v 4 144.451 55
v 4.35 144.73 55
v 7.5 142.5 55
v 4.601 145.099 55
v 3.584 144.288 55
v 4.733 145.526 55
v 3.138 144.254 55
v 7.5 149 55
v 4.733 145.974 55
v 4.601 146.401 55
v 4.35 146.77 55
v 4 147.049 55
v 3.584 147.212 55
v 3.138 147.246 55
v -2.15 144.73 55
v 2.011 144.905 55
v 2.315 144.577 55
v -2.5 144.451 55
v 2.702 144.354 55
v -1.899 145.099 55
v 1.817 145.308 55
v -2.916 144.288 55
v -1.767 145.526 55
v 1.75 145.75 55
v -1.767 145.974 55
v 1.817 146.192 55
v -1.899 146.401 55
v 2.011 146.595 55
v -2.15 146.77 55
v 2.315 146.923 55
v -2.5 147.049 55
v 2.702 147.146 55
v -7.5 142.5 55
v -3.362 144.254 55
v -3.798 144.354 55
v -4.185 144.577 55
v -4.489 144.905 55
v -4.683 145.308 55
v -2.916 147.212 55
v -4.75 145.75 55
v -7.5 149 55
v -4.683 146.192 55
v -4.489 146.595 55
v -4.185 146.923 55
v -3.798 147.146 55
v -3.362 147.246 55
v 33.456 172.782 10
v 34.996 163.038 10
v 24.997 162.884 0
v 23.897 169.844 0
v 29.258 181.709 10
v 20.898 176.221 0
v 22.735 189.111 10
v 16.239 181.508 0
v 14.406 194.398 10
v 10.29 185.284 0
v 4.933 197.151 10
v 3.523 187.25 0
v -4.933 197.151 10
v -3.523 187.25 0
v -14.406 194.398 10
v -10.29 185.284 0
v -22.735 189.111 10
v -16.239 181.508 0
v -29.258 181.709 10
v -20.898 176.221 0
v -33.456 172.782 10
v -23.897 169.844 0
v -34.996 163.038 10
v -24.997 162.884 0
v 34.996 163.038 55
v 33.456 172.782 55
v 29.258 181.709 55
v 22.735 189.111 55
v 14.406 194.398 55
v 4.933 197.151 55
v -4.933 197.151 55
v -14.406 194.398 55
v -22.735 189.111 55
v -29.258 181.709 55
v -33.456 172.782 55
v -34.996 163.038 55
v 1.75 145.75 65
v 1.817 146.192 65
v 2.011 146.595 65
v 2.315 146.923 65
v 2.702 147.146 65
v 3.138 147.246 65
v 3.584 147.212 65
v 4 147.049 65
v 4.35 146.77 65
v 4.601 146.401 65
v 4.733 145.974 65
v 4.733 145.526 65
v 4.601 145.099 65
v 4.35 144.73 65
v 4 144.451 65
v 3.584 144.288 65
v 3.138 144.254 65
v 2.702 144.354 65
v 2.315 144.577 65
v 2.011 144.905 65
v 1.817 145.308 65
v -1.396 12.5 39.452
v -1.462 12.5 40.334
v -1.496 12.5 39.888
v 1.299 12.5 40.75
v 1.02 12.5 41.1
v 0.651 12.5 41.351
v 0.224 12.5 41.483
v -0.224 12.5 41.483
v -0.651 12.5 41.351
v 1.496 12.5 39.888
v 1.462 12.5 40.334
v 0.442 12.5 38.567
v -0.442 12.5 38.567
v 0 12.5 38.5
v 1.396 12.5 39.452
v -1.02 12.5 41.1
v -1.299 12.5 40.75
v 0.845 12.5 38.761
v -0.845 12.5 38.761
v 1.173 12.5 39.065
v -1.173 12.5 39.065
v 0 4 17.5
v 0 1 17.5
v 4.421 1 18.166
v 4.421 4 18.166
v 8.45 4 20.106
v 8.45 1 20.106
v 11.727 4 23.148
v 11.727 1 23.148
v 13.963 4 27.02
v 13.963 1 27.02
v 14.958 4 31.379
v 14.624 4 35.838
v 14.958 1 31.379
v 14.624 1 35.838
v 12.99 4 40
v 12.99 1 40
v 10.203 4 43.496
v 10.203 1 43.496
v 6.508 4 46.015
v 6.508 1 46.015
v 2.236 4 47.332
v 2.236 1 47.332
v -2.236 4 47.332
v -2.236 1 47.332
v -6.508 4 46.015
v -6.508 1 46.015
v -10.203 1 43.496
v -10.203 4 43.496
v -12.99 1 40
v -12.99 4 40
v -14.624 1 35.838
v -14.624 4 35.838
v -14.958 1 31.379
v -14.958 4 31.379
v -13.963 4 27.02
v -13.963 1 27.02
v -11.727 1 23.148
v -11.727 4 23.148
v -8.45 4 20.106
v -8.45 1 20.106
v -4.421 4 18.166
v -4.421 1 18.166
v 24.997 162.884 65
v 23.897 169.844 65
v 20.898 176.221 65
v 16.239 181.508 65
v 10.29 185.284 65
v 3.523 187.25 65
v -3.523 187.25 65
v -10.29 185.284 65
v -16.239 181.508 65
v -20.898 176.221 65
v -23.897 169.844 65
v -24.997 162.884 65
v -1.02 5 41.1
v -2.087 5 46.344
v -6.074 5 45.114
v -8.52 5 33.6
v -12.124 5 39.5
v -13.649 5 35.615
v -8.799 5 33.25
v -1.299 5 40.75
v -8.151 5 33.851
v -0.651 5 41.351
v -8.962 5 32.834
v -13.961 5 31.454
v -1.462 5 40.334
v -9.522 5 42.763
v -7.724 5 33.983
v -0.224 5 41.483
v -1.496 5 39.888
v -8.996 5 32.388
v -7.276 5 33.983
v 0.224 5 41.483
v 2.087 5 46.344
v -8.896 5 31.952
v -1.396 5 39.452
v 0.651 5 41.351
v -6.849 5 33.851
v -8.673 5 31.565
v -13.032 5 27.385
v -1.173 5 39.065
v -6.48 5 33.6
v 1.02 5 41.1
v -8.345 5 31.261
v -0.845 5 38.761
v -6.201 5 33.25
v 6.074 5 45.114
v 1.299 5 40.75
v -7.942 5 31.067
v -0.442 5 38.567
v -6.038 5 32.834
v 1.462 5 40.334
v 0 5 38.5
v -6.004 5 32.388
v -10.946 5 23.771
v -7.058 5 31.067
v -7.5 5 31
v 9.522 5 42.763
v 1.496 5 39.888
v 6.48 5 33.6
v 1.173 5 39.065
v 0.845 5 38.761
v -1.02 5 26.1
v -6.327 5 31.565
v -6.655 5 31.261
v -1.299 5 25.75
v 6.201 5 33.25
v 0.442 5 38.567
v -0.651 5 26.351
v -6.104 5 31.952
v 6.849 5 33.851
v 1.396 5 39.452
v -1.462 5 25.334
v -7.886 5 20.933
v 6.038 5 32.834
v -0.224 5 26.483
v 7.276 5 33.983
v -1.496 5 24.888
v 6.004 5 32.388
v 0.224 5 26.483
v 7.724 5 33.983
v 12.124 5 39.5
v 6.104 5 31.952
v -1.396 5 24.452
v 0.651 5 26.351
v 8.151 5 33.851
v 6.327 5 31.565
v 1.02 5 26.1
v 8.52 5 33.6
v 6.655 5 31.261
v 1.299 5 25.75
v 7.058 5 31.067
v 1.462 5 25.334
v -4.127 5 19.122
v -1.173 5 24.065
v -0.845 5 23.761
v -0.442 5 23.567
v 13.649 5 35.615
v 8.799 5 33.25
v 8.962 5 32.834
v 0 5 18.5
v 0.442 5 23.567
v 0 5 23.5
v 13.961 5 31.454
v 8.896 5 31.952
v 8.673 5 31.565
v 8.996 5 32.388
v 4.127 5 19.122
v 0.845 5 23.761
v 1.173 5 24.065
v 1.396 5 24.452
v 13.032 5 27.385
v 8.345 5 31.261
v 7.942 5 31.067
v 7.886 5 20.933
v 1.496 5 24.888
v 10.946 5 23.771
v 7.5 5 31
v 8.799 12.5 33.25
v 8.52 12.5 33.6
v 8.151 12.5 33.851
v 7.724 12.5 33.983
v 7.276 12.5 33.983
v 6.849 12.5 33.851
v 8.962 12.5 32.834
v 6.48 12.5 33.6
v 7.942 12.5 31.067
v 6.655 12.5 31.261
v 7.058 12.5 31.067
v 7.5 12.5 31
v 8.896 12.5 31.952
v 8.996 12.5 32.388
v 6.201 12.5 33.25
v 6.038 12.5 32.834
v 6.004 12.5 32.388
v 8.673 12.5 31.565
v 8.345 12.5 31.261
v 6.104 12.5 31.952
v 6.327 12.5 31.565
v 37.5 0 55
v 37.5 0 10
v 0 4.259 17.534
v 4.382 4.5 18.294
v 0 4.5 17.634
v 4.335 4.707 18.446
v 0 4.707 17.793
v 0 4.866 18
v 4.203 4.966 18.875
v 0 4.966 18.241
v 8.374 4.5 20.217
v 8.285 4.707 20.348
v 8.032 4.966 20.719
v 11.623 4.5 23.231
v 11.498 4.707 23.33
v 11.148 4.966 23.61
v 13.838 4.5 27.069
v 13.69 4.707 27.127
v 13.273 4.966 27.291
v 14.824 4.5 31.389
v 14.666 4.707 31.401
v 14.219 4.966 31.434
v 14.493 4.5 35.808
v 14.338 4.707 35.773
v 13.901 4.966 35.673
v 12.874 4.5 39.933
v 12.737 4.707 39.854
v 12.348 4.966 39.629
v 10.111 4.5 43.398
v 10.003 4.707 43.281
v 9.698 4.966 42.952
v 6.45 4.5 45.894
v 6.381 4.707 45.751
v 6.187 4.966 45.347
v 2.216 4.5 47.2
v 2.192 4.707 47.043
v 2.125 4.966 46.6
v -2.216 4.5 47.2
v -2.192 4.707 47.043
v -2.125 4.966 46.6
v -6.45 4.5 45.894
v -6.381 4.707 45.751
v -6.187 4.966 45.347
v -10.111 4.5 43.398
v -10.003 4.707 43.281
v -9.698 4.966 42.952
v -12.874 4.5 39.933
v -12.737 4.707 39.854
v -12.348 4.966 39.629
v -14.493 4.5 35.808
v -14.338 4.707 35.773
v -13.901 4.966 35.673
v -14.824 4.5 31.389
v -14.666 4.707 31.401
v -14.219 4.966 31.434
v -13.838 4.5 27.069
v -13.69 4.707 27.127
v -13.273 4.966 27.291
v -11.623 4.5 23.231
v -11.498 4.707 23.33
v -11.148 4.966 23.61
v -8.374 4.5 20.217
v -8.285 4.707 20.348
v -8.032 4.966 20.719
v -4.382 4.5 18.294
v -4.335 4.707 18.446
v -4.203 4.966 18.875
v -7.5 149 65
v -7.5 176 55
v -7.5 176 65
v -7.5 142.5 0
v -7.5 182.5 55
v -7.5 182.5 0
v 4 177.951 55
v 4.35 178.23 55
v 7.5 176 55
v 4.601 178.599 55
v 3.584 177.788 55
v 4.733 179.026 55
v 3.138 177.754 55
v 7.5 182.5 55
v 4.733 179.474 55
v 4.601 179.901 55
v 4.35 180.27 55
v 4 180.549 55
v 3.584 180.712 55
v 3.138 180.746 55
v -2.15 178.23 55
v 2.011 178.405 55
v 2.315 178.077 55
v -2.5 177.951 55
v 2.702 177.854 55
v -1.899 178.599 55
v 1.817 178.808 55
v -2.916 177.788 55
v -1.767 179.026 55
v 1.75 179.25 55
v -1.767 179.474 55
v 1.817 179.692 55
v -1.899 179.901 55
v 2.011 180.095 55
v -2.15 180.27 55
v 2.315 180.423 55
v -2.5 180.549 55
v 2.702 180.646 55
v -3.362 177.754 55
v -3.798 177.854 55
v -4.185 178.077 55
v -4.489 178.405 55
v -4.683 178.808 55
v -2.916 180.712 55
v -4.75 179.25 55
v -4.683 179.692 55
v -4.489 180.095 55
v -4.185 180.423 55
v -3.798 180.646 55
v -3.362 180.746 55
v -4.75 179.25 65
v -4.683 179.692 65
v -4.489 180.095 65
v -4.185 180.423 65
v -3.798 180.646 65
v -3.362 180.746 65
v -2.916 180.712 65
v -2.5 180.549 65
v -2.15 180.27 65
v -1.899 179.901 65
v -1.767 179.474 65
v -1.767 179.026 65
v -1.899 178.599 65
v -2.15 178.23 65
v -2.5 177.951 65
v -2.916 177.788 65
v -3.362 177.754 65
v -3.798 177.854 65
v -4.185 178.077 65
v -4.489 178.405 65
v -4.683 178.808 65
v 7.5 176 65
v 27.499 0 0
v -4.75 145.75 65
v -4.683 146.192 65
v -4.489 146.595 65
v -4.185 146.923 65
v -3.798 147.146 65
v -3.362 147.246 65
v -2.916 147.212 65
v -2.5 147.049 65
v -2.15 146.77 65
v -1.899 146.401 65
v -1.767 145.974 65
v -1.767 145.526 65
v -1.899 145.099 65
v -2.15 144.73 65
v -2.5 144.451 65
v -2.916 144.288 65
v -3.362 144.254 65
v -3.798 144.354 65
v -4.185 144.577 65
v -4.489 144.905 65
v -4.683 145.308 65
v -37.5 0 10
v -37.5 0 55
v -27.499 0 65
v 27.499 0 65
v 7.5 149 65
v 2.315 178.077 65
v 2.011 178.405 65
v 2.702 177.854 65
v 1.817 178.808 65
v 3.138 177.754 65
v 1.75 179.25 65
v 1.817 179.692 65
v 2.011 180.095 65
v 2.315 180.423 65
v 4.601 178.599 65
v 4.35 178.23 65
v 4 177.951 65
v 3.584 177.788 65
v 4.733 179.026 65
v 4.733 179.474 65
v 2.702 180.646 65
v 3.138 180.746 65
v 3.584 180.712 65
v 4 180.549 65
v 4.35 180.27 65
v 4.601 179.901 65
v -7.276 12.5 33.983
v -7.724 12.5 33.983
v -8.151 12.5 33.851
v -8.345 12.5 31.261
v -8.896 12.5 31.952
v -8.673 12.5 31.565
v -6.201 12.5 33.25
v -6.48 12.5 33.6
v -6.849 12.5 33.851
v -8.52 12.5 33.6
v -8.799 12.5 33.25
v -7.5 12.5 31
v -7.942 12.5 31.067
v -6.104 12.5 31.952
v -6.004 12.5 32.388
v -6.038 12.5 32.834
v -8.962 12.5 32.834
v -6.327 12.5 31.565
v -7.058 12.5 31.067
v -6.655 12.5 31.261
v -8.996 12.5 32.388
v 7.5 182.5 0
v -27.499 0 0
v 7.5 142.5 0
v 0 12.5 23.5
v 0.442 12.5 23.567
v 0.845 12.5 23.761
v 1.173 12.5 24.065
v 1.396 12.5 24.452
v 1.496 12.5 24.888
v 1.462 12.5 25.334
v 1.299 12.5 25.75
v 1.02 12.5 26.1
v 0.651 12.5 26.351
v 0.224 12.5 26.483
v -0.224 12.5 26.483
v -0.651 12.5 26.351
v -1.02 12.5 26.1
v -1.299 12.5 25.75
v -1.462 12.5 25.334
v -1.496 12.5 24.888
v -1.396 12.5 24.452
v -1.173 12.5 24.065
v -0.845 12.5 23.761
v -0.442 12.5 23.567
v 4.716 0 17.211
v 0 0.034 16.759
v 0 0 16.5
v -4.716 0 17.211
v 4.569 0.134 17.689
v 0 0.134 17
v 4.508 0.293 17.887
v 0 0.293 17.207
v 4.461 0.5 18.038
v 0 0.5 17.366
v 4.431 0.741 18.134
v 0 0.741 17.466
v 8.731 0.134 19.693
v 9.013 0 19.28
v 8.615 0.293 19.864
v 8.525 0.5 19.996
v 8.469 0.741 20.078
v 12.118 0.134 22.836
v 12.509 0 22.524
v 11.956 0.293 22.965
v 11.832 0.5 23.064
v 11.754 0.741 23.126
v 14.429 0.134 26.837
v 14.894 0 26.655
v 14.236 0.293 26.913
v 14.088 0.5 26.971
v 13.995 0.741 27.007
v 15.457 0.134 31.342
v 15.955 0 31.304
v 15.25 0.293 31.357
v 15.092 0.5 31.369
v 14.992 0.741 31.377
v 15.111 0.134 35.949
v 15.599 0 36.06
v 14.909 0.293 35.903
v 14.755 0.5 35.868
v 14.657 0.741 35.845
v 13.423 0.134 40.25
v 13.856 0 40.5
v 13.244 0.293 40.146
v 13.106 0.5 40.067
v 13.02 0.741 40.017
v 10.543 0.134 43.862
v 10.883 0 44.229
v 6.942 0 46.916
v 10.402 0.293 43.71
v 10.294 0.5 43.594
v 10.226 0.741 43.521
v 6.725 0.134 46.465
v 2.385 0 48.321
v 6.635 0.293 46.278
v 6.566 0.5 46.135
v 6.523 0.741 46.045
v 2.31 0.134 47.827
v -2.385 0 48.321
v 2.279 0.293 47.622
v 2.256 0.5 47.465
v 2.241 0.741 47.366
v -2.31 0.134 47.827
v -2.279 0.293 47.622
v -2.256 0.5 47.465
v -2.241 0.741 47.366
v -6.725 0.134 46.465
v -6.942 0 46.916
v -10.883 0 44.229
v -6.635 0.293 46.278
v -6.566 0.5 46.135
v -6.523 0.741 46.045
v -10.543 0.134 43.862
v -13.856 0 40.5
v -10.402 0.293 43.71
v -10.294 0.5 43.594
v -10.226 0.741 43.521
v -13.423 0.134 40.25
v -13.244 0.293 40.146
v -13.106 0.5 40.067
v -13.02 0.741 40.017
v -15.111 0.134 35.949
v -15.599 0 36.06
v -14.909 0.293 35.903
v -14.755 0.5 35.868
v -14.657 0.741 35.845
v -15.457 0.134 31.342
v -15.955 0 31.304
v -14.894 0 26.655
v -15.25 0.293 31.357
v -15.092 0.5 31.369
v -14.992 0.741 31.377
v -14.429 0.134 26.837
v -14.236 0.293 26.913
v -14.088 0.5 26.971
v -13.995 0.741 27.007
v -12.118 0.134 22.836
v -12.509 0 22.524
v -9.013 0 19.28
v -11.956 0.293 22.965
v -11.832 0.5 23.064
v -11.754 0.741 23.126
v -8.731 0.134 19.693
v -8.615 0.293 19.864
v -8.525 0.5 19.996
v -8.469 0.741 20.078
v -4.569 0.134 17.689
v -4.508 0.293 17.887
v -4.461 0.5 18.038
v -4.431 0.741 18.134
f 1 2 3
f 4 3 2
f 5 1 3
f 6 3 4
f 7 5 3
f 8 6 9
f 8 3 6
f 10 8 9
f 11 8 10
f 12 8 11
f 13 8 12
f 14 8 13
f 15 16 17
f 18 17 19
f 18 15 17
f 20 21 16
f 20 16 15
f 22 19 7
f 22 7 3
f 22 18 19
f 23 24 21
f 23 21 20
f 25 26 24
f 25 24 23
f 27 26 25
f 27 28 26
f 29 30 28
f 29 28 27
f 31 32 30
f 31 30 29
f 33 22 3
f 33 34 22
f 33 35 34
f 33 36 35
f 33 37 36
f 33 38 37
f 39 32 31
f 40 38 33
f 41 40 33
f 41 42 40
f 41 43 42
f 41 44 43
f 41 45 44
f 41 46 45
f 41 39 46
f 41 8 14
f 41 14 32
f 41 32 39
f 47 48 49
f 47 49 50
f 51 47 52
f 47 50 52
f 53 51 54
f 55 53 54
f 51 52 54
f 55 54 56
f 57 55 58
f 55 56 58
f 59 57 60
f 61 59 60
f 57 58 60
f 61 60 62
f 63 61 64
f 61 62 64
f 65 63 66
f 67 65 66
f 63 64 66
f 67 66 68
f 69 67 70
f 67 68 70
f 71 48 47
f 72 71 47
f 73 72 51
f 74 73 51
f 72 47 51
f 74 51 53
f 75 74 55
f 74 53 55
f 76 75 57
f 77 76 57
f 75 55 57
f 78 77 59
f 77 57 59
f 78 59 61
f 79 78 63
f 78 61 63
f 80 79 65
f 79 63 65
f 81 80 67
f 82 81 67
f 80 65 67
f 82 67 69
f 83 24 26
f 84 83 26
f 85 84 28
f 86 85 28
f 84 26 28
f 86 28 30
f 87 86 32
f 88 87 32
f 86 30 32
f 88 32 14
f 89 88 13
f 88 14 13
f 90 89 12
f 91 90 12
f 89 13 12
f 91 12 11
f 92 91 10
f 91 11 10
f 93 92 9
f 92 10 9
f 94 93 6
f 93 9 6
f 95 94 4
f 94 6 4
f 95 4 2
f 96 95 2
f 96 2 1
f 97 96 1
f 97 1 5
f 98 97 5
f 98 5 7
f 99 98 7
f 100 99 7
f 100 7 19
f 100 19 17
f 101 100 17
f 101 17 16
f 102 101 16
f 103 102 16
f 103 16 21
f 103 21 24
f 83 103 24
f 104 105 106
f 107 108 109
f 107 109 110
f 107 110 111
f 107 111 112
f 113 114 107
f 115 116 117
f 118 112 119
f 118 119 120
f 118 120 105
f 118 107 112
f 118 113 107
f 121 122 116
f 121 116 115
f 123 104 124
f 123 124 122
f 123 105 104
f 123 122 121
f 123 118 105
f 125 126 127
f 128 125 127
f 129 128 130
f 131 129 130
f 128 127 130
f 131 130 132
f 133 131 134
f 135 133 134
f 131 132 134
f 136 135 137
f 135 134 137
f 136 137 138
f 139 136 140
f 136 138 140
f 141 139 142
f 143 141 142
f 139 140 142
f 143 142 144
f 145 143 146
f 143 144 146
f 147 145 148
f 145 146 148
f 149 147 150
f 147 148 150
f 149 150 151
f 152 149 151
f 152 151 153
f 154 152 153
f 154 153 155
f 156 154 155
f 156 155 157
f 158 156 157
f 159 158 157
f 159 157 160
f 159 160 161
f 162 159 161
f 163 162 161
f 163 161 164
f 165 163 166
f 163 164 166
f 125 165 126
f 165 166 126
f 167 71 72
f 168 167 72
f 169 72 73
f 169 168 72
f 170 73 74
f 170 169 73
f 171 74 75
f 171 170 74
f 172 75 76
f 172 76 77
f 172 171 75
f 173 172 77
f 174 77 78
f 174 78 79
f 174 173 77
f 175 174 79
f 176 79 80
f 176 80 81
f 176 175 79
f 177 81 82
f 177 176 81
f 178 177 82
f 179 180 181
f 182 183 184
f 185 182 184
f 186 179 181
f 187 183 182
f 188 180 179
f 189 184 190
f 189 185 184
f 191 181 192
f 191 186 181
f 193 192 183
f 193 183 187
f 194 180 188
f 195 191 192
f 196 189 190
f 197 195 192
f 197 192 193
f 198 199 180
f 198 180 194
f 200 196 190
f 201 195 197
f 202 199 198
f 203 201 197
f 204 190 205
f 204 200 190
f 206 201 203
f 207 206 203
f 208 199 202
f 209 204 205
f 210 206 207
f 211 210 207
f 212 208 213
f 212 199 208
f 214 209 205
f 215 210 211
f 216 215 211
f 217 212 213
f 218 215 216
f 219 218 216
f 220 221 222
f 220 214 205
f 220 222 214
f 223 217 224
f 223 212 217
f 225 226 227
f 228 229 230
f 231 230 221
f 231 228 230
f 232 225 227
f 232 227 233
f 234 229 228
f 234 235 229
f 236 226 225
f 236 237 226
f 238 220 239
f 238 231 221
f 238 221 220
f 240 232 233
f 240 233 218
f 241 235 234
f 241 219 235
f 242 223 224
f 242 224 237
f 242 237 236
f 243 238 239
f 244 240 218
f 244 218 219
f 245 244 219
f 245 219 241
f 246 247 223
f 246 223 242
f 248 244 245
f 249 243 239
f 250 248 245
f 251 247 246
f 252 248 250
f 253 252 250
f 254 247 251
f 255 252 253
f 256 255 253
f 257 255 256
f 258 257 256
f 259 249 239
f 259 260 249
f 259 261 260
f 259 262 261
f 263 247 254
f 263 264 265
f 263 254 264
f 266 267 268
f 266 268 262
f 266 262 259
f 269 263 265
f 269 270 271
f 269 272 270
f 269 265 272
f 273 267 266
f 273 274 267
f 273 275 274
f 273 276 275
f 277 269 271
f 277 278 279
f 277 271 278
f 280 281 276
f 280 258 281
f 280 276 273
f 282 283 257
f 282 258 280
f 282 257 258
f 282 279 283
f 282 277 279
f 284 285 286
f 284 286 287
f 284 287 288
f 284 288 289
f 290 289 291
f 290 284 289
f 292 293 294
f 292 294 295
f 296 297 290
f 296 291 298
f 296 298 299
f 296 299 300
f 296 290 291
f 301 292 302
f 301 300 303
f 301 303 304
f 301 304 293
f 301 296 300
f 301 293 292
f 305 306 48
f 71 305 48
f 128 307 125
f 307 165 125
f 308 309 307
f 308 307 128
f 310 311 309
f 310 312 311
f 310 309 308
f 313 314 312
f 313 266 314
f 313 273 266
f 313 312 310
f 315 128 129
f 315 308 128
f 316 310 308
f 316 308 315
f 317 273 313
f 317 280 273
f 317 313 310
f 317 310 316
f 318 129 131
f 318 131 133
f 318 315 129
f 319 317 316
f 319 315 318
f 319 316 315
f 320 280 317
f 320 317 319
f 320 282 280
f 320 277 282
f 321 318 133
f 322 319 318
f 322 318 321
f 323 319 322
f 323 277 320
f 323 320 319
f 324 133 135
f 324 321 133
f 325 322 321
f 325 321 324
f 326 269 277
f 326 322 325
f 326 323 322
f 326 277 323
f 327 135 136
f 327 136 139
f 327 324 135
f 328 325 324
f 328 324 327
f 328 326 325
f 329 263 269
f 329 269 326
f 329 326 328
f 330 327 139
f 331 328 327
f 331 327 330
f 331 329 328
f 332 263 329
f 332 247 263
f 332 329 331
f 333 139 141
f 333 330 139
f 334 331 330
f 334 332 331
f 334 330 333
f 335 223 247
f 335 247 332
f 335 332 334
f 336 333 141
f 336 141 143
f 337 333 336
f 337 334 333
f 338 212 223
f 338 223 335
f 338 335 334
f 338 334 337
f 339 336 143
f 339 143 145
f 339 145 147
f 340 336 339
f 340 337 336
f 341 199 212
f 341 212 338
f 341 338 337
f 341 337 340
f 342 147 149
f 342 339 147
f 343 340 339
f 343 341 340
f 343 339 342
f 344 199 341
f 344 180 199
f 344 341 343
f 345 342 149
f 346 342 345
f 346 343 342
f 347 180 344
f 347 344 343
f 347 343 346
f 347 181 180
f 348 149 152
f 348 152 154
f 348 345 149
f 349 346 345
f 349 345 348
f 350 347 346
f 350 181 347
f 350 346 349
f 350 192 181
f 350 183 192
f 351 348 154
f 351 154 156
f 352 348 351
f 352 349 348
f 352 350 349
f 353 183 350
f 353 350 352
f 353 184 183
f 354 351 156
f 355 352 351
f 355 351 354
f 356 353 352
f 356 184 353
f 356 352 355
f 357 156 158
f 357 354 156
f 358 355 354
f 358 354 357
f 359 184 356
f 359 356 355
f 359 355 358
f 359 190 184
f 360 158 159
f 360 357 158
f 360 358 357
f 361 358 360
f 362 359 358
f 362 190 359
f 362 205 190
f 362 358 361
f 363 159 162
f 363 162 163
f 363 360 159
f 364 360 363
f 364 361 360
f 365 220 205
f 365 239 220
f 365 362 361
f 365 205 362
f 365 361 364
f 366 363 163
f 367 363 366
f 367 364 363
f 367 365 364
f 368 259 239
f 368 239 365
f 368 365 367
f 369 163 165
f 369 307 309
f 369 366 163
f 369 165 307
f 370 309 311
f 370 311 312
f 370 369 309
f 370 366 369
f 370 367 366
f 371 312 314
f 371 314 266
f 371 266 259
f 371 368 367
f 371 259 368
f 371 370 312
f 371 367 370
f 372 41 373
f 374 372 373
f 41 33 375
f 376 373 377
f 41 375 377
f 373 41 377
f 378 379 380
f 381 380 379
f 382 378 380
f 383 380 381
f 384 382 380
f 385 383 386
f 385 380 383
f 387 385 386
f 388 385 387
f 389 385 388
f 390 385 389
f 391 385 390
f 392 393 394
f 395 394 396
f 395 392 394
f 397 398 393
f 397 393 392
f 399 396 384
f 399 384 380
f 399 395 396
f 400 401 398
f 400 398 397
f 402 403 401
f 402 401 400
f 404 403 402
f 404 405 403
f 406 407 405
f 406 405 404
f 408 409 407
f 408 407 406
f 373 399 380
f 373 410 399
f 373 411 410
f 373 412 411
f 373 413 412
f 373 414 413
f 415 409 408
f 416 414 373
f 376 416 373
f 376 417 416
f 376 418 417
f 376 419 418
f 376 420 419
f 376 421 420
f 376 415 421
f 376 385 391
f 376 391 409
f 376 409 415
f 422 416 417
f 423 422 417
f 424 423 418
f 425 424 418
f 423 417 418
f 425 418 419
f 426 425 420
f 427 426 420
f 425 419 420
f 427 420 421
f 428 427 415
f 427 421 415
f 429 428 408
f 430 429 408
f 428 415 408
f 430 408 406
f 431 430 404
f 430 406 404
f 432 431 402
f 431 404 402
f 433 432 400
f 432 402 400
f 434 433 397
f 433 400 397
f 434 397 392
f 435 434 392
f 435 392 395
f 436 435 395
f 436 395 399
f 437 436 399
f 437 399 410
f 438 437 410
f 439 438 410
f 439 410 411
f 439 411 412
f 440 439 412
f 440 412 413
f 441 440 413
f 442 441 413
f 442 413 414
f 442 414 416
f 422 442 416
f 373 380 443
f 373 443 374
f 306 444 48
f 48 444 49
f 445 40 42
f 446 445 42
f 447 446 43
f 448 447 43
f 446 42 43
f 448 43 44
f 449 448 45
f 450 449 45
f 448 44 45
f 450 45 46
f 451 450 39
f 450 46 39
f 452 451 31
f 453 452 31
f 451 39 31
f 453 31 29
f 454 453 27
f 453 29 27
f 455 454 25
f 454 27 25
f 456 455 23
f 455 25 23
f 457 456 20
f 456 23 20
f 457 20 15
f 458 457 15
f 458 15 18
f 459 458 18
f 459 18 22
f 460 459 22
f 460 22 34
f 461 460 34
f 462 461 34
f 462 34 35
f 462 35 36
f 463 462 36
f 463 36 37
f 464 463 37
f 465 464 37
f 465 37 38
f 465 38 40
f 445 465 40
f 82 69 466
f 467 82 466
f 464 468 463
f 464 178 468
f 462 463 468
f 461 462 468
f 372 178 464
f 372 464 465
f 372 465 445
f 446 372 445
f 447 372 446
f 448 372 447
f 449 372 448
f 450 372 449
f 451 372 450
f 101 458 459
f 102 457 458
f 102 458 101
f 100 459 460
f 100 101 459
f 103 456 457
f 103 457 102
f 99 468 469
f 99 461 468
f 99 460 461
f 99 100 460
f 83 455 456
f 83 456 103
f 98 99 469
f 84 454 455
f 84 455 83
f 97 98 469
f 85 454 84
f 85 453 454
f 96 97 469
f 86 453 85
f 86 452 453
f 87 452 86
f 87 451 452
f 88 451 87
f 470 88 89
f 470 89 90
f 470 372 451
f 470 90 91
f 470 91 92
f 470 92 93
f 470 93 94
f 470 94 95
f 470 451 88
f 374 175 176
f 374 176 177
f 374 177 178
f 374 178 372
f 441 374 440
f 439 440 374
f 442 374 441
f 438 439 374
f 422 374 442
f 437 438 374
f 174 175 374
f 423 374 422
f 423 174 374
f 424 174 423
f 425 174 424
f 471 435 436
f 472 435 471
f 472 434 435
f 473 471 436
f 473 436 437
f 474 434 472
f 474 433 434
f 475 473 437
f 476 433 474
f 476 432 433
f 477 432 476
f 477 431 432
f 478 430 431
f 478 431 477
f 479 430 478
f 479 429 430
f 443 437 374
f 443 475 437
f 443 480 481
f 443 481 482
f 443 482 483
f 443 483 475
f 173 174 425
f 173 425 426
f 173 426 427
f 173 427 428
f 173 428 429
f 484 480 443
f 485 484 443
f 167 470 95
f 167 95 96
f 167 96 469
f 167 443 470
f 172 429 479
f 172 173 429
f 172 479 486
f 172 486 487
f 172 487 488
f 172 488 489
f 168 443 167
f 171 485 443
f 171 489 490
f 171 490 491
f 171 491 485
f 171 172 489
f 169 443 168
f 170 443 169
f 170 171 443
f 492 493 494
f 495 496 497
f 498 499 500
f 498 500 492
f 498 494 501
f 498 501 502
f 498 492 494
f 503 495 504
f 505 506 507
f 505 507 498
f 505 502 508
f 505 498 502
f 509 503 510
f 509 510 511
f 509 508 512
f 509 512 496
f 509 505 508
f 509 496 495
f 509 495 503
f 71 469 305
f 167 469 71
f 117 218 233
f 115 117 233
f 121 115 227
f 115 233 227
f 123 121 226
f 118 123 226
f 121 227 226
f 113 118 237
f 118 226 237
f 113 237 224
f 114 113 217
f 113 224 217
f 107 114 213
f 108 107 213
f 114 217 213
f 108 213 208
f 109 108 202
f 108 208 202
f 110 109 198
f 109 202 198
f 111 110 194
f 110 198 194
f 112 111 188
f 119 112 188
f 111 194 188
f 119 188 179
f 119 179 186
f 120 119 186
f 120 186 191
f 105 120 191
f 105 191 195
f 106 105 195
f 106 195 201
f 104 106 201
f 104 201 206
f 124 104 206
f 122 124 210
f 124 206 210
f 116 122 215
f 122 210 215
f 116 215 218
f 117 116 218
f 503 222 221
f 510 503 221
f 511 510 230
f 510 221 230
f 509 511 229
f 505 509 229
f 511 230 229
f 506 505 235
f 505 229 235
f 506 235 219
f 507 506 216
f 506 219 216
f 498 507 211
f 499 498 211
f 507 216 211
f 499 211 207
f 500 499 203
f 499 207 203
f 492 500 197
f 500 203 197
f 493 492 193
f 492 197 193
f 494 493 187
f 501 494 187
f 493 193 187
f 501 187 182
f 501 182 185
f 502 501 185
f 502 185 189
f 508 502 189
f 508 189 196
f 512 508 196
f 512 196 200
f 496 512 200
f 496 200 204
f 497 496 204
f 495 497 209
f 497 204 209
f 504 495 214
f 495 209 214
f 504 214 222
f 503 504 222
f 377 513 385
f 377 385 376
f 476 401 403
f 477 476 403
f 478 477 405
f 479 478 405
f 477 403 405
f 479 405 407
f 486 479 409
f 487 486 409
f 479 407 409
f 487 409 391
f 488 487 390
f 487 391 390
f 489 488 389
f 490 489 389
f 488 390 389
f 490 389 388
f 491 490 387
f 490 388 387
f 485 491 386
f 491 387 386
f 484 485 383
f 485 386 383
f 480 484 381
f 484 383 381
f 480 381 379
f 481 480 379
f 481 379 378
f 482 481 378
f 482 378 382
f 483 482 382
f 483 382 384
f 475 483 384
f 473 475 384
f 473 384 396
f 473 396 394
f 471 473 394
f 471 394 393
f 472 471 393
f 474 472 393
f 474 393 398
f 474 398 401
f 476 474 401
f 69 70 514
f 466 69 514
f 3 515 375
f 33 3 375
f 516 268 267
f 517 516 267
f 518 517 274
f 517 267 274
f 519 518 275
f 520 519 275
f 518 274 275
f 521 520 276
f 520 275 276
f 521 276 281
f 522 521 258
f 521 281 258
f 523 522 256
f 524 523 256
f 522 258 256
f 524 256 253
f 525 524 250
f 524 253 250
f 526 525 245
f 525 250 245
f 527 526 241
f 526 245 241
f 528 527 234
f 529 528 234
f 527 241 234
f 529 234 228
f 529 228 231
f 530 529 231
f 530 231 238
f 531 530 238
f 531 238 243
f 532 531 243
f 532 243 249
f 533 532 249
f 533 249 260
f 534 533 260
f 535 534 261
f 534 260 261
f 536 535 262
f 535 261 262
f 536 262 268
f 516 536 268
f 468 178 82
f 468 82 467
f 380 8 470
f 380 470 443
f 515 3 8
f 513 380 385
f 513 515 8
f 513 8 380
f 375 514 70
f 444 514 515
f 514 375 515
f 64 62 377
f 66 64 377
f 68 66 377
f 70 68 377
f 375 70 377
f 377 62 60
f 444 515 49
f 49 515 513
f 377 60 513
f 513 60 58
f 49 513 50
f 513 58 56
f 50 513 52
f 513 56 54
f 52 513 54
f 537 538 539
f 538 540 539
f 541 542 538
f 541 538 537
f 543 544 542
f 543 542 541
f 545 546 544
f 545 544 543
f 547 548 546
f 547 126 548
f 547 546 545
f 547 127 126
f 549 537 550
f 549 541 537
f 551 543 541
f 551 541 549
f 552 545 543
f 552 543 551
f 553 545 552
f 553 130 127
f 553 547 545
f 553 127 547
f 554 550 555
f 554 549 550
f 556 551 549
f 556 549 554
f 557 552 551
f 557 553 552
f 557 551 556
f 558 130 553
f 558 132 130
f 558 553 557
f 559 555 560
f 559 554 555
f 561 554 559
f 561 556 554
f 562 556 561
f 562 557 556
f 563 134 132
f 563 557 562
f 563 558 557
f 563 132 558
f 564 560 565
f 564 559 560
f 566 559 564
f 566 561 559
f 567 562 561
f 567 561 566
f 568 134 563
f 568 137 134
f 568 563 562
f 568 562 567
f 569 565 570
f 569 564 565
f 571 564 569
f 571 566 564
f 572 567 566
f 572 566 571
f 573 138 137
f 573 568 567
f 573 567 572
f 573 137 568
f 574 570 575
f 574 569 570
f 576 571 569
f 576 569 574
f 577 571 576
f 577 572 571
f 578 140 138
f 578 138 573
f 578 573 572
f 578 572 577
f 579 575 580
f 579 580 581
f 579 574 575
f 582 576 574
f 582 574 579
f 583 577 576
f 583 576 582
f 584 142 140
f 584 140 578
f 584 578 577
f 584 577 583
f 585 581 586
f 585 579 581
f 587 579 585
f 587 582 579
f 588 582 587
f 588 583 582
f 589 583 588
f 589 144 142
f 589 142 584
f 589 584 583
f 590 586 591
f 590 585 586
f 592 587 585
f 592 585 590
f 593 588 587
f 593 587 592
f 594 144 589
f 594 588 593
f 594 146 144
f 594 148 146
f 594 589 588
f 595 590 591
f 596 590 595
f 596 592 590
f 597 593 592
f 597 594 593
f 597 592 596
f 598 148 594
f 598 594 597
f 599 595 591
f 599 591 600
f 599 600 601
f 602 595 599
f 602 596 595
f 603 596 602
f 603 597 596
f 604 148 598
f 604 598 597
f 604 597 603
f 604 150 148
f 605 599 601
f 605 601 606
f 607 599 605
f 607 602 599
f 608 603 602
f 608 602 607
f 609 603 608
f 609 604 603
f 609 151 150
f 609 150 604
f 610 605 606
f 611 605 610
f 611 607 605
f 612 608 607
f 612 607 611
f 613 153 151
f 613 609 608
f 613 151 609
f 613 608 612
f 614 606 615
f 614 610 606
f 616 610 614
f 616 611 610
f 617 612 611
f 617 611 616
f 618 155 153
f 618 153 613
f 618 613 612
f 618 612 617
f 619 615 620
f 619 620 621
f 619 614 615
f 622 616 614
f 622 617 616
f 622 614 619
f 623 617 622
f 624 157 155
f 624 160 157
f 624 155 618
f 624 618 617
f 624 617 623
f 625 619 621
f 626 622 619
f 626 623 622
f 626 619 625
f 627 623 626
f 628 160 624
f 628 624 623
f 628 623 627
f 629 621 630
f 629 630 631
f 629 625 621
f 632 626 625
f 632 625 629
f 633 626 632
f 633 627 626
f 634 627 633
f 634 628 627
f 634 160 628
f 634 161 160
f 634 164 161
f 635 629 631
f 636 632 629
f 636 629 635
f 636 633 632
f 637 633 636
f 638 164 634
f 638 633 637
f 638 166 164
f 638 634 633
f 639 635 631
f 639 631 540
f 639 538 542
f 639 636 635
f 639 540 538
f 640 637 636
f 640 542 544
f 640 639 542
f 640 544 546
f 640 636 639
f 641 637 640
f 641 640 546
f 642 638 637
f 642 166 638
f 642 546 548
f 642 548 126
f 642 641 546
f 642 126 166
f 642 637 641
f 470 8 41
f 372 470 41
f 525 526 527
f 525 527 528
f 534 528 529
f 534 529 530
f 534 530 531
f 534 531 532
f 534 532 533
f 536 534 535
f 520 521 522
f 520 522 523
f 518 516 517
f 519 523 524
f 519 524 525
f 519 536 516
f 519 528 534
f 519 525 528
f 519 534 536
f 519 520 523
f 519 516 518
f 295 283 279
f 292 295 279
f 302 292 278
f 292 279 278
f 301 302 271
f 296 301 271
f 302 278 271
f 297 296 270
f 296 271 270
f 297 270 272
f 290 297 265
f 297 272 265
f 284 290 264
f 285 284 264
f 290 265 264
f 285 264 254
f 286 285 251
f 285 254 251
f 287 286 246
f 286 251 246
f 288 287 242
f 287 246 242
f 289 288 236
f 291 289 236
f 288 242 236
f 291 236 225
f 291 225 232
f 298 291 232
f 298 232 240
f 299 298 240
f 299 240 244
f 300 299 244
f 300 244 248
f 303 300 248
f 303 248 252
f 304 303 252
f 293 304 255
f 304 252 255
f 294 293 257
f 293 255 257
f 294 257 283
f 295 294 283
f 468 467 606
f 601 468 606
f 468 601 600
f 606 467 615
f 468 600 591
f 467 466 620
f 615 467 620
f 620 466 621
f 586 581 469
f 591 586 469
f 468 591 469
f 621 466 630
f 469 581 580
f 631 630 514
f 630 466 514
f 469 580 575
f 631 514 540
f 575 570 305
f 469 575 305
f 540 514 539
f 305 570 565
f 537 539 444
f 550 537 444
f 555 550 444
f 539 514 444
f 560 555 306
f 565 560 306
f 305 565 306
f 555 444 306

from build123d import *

# Parameters (mm, degrees)
BOSS_EXTRUDE1_DEPTH = 65
CHAMFER1_SIZE       = 10
SKETCH2_R           = 15
CUT_EXTRUDE1_DEPTH  = 5
SKETCH3_R           = 1.5
CUT_EXTRUDE2_DEPTH  = 7.5
FILLET1_R           = 1
SKETCH4_W           = 15
SKETCH4_H           = 40
CUT_EXTRUDE3_DEPTH  = 55
SKETCH5_W           = 15
SKETCH5_H           = 27
SKETCH5_R           = 1.5
CUT_EXTRUDE4_DEPTH  = 209.416650007


with BuildPart() as part:
    # Sketch1 → Boss-Extrude1 (new body)
    with BuildSketch(Plane.XY):
        with BuildLine():
            Line((-37.5, 0), (37.5, 0))
            Line((37.5, 0), (34.995872386, 163.037509012))
            ThreePointArc((34.995872386, 163.037509012), (0, 197.5), (-34.995872386, 163.037509012))
            Line((-34.995872386, 163.037509012), (-37.5, 0))
        make_face()
    extrude(amount=BOSS_EXTRUDE1_DEPTH)

    # Chamfer1
    chamfer1_edges = [part.edges().sort_by_distance(p)[0] for p in [
        (-36.247936193, 81.518754506, 65),
        (36.247936193, 81.518754506, 65),
        (-36.247936193, 81.518754506, 0),
        (0, 197.5, 0),
        (36.247936193, 81.518754506, 0),
        (0, 197.5, 65),
    ]]
    chamfer(chamfer1_edges, length=CHAMFER1_SIZE)

    # Sketch2 → Cut-Extrude1 (cut)
    with BuildSketch(Plane(origin=(0, 0, 0), x_dir=(-1, 0, 0), z_dir=(0, -1, 0))):
        with Locations(Location((0, -32.5, 0), (0, 0, 90))):
            Circle(SKETCH2_R)
    extrude(amount=-CUT_EXTRUDE1_DEPTH, mode=Mode.SUBTRACT)

    # Sketch3 → Cut-Extrude2 (cut)
    with BuildSketch(Plane(origin=(0, 5, 0), x_dir=(-1, 0, 0), z_dir=(0, -1, 0))):
        with Locations(Location((0, -40, 0), (0, 0, 90))):
            Circle(SKETCH3_R)
        with Locations(Location((-7.5, -32.5, 0), (0, 0, 90))):
            Circle(SKETCH3_R)
        with Locations(Location((0, -25, 0), (0, 0, 90))):
            Circle(SKETCH3_R)
        with Locations(Location((7.5, -32.5, 0), (0, 0, 90))):
            Circle(SKETCH3_R)
    extrude(amount=-CUT_EXTRUDE2_DEPTH, mode=Mode.SUBTRACT)

    # Fillet1
    fillet1_edges = [part.edges().sort_by_distance(p)[0] for p in [
        (0, 5, 47.5),
        (0, 0, 47.5),
    ]]
    fillet(fillet1_edges, radius=FILLET1_R)

    # Sketch4 → Cut-Extrude3 (cut)
    with BuildSketch(Plane(origin=(0, 0, 0), x_dir=(-1, 0, 0), z_dir=(0, 0, -1))):
        with Locations((0, 162.5)):
            Rectangle(SKETCH4_W, SKETCH4_H)
    extrude(amount=-CUT_EXTRUDE3_DEPTH, mode=Mode.SUBTRACT)

    # Sketch5 → Cut-Extrude4 (cut, through all)
    with BuildSketch(Plane(origin=(0, 0, 55), x_dir=(-1, 0, 0), z_dir=(0, 0, -1))):
        with Locations((0, 162.5)):
            Rectangle(SKETCH5_W, SKETCH5_H)
        with Locations((-3.25, 179.25)):
            Circle(SKETCH5_R)
        with Locations((3.25, 179.25)):
            Circle(SKETCH5_R)
        with Locations((-3.25, 145.75)):
            Circle(SKETCH5_R)
        with Locations((3.25, 145.75)):
            Circle(SKETCH5_R)
    extrude(amount=-CUT_EXTRUDE4_DEPTH, mode=Mode.SUBTRACT)


solid = part.part
